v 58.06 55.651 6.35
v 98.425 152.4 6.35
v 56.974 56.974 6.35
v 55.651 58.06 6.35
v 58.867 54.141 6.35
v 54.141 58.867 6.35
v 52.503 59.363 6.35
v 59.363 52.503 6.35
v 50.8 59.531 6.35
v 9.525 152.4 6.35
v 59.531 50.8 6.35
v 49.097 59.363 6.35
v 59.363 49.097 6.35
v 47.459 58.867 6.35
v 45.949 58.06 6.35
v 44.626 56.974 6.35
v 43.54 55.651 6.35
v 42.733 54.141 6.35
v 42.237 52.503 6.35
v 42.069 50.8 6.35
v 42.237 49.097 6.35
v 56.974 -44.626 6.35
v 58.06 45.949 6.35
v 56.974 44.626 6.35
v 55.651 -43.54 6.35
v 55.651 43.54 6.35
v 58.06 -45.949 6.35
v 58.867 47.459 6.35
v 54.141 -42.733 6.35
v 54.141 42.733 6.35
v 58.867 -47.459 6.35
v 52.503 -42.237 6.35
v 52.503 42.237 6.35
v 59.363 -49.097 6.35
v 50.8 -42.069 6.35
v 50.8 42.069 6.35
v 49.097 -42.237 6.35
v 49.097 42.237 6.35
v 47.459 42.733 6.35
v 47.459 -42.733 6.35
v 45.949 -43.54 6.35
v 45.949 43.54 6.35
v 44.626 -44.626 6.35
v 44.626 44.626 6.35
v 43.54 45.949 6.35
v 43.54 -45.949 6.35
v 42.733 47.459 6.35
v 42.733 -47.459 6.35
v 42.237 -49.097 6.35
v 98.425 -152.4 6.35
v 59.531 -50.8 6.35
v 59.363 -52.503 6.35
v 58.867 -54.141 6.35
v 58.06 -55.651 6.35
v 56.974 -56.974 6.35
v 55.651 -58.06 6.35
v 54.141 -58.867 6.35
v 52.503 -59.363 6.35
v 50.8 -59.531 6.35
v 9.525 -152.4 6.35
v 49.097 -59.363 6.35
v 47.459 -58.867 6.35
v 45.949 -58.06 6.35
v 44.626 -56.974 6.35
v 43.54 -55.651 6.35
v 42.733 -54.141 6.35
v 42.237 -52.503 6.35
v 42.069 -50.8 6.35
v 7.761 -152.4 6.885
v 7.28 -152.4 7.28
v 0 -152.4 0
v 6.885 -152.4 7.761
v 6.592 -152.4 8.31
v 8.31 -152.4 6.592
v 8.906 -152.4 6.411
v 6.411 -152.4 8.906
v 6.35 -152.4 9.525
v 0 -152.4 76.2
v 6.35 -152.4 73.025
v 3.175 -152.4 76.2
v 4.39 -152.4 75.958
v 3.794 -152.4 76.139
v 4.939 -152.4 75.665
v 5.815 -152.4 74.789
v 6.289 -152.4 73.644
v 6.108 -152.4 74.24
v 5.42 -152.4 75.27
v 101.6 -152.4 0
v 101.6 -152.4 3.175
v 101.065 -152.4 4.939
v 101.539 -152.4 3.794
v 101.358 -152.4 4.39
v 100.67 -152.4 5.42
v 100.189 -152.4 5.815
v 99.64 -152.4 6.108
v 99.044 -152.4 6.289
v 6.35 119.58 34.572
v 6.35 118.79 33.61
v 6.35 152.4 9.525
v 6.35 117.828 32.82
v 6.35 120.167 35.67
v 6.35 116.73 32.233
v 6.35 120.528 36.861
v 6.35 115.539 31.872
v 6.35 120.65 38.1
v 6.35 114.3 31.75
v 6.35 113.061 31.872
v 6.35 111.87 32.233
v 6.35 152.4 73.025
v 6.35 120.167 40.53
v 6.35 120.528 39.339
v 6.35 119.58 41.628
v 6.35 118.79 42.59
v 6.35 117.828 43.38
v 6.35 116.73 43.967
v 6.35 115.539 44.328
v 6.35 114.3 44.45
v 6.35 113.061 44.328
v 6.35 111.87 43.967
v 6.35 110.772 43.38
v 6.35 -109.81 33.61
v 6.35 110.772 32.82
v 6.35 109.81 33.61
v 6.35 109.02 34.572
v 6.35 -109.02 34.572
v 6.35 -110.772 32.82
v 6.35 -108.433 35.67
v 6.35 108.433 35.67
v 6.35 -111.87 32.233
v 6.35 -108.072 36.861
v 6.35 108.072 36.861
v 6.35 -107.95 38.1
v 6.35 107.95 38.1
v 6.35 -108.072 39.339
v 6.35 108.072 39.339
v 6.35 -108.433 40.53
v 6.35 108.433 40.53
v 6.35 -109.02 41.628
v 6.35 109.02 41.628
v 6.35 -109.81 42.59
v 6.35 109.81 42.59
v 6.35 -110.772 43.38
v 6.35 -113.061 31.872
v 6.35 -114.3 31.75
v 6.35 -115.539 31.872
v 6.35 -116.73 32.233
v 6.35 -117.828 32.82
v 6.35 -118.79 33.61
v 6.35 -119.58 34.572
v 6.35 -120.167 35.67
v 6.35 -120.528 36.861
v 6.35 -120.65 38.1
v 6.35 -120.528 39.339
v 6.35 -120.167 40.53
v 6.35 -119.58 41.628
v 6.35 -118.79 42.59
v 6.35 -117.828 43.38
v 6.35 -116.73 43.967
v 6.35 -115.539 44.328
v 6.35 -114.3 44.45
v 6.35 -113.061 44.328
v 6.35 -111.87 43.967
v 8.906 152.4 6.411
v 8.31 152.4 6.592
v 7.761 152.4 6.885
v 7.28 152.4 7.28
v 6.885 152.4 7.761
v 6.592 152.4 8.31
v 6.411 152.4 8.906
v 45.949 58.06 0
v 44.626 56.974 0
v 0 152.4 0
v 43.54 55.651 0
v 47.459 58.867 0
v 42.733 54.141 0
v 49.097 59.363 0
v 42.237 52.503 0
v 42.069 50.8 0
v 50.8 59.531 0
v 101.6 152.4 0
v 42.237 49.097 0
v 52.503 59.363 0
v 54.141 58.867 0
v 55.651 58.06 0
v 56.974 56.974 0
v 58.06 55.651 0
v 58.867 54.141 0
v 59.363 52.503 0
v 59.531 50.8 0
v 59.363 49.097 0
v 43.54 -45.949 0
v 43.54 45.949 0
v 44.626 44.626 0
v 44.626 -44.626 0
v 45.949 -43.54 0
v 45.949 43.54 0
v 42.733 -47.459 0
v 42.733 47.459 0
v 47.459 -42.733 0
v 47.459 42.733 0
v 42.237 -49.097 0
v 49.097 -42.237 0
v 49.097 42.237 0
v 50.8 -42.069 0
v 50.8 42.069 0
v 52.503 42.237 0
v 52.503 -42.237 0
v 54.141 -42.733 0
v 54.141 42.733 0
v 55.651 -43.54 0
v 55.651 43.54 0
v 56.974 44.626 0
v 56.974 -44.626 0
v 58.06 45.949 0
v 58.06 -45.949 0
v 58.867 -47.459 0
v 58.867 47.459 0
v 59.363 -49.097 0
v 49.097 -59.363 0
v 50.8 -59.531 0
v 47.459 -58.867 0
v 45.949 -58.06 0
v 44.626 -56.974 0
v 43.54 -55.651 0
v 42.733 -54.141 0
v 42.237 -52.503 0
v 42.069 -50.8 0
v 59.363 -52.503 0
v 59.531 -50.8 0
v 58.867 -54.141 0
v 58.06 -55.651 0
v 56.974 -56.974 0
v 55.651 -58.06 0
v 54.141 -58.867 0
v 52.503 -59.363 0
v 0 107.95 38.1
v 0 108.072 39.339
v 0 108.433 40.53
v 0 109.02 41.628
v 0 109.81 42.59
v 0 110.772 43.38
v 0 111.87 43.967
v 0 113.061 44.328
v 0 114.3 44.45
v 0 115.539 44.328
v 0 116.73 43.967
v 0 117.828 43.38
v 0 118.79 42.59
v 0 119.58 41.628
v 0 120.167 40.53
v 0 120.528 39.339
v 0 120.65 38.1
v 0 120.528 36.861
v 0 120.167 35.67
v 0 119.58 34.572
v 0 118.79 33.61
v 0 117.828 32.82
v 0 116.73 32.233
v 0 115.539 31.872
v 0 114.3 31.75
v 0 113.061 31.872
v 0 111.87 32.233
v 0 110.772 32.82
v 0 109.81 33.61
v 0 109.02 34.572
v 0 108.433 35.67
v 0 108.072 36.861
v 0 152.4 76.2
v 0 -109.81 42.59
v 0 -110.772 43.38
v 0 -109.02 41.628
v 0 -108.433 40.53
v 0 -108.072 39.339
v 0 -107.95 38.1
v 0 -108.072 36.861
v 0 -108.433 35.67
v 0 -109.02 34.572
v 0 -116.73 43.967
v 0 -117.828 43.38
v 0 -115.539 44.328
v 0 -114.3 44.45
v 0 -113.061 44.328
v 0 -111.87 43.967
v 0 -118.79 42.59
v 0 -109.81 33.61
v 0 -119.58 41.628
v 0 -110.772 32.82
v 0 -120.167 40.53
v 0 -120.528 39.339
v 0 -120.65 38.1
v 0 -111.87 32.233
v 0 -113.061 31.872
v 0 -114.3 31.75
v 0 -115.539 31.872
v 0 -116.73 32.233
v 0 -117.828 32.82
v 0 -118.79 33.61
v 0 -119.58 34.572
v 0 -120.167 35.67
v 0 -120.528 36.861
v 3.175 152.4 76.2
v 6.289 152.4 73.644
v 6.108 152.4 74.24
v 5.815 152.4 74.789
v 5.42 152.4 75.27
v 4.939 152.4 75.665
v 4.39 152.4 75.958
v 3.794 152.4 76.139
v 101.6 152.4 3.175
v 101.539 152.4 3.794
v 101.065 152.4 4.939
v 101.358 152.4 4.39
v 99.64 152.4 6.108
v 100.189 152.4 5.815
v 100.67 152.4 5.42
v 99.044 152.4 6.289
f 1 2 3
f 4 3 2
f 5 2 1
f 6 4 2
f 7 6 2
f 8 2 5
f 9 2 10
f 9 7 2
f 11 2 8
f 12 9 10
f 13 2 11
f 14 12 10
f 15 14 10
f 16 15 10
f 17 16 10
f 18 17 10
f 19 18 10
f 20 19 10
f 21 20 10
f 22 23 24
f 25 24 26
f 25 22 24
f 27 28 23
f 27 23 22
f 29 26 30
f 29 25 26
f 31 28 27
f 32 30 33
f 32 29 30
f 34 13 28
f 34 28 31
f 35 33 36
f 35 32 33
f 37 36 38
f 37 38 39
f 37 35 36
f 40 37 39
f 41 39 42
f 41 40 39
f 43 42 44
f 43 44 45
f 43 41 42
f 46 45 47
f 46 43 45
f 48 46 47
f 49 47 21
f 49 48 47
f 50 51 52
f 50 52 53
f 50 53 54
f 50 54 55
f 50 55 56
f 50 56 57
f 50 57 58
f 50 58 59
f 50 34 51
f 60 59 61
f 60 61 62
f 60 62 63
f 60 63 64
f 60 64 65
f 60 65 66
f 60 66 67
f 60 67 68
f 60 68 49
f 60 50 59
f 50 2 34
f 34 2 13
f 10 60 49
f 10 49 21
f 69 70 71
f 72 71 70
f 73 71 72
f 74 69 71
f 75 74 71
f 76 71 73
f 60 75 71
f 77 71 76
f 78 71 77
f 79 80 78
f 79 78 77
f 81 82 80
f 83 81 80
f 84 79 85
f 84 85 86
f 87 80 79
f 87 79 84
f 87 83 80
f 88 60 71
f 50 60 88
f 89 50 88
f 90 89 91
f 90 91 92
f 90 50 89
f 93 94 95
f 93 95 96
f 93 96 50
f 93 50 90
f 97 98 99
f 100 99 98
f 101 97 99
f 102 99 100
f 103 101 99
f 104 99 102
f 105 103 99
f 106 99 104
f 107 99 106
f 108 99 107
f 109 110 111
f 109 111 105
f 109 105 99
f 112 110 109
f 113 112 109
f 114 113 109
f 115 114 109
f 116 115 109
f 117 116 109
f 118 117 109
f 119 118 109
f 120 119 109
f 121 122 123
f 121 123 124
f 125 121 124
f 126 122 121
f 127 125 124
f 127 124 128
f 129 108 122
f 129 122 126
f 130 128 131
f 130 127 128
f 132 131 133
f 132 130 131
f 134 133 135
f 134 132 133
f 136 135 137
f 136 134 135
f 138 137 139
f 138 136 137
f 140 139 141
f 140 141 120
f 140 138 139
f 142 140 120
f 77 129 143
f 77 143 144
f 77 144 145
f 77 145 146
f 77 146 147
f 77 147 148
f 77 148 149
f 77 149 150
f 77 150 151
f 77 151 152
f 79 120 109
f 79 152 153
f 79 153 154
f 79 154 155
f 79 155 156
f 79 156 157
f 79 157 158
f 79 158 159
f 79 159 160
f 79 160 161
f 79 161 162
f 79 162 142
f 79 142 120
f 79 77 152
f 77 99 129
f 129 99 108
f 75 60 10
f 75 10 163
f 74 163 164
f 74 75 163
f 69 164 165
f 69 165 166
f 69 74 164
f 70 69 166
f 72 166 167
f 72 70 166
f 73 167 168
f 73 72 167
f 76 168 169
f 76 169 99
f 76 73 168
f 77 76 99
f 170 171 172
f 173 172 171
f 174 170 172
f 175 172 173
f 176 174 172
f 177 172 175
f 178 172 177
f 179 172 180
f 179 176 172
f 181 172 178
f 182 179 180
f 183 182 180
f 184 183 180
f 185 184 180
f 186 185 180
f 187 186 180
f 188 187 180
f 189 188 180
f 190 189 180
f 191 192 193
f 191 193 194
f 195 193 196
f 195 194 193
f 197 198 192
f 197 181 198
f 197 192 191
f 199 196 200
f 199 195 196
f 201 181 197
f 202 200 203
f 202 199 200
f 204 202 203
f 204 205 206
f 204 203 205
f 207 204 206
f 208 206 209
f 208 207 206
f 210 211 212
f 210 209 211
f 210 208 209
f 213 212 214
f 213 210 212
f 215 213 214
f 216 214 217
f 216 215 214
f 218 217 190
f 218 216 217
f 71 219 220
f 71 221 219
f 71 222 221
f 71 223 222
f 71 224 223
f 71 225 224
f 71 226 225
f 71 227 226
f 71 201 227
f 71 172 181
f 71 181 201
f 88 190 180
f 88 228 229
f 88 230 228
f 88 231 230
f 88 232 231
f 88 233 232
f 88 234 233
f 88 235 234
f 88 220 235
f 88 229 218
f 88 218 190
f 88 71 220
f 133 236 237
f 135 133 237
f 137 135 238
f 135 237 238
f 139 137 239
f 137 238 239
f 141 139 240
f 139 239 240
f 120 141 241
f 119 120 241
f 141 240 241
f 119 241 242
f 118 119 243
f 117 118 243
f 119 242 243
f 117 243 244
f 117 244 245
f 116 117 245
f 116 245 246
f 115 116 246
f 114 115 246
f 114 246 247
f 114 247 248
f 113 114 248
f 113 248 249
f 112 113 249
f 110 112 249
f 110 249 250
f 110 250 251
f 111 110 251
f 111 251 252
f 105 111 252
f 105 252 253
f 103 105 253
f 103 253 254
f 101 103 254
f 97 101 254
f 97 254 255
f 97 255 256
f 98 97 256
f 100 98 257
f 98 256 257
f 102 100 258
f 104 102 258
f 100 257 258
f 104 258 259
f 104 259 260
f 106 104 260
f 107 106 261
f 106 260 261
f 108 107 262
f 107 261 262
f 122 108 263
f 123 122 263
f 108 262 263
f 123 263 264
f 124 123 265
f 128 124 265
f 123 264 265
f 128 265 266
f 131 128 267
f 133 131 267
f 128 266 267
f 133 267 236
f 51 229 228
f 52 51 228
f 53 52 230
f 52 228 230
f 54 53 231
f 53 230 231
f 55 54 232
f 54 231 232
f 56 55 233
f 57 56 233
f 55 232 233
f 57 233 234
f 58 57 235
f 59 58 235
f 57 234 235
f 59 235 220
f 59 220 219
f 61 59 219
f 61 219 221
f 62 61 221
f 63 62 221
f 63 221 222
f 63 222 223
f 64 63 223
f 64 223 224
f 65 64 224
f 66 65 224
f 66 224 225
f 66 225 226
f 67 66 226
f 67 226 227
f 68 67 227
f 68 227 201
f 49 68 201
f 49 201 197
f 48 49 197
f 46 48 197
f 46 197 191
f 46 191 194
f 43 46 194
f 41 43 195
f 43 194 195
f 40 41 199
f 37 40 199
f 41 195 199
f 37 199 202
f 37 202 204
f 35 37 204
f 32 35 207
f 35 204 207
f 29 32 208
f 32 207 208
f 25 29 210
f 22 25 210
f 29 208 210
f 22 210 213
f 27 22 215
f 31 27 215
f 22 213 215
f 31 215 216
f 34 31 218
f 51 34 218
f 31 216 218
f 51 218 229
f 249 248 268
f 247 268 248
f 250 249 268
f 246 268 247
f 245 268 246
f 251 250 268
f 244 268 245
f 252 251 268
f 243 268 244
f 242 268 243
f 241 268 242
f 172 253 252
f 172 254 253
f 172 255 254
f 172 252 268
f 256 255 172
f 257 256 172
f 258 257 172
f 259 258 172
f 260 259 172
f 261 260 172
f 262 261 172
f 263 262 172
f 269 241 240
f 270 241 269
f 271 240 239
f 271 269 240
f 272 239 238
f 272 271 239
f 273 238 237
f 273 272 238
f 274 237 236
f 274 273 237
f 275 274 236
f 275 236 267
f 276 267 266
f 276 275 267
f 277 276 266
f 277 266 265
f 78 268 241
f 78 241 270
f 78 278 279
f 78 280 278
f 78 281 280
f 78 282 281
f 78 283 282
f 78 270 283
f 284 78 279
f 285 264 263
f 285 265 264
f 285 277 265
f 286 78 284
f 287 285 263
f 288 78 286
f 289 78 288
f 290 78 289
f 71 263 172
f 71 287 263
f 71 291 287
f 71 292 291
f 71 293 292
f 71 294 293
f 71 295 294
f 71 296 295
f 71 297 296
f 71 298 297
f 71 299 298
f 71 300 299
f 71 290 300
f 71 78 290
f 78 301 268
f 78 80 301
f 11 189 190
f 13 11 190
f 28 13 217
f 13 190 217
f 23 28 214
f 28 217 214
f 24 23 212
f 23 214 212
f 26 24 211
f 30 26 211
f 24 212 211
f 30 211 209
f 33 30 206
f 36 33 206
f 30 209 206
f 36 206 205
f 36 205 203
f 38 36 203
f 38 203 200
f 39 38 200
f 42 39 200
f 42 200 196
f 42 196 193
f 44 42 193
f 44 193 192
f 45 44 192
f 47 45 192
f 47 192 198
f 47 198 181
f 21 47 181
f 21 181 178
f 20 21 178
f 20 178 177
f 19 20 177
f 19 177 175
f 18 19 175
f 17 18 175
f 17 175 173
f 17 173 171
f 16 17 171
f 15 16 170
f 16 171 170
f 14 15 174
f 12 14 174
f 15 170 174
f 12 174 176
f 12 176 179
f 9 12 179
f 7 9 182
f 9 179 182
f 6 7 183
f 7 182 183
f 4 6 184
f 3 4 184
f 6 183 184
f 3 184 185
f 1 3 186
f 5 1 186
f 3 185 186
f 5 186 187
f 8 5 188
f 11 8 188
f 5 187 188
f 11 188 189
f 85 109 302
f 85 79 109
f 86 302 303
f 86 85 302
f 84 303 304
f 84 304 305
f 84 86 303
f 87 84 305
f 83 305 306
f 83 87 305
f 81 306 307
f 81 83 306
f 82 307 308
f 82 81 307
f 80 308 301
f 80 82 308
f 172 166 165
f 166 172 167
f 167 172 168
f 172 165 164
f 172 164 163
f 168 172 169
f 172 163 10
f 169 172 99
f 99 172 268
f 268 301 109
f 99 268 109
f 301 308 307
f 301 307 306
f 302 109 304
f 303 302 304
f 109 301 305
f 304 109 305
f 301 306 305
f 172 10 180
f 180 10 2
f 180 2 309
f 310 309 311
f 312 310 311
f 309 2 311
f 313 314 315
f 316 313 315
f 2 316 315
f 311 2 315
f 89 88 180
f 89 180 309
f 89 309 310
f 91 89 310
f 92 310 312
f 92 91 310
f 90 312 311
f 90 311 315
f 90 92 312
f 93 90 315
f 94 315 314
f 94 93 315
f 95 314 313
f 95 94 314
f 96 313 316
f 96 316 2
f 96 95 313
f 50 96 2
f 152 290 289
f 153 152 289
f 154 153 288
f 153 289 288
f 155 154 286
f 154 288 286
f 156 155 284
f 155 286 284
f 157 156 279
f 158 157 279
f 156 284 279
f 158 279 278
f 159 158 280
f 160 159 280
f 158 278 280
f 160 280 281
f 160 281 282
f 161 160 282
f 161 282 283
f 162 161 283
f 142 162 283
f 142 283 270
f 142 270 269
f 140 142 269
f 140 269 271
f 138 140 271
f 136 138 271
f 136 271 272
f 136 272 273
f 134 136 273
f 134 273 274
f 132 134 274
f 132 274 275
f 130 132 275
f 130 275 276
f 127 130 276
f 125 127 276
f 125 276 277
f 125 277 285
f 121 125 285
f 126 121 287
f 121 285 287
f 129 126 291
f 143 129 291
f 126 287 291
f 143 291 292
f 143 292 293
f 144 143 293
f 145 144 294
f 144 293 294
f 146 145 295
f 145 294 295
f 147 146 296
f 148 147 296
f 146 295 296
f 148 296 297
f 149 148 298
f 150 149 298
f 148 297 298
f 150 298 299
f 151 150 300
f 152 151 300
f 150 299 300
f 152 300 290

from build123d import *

# Parameters (mm, degrees)
F1_DEPTH = 152.4
F2_R     = 8.73125
F3_DEPTH = 76.201
F4_R     = 6.35
F5_DEPTH = 101.601


with BuildPart() as f1:
    # F0 (on Front) → F1 (new body, symmetric)
    with BuildSketch(Plane.XZ):
        with BuildLine():
            Line((3.175, 76.2), (0, 76.2))
            Line((0, 76.2), (0, 0))
            Line((0, 0), (101.6, 0))
            Line((101.6, 0), (101.6, 3.175))
            ThreePointArc((101.6, 3.175), (100.6700640303, 5.4200640303), (98.425, 6.35))
            Line((98.425, 6.35), (9.525, 6.35))
            ThreePointArc((9.525, 6.35), (7.2799359697, 7.2799359697), (6.35, 9.525))
            Line((6.35, 9.525), (6.35, 73.025))
            ThreePointArc((6.35, 73.025), (5.4200640303, 75.2700640303), (3.175, 76.2))
        make_face()
    extrude(amount=F1_DEPTH, both=True)

    # F2 (on face) → F3 (cut, through all)
    with BuildSketch(Plane(origin=(0, 0, 0), x_dir=(1, 0, 0), z_dir=(0, 0, -1))):
        with Locations((50.8, 50.8)):
            Circle(F2_R)
        with Locations((50.8, -50.8)):
            Circle(F2_R)
    extrude(amount=-F3_DEPTH, mode=Mode.SUBTRACT)

    # F4 (on face) → F5 (cut, through all)
    with BuildSketch(Plane(origin=(0, 0, 0), x_dir=(0, -1, 0), z_dir=(-1, 0, 0))):
        with Locations((-114.3, 38.1)):
            Circle(F4_R)
        with Locations((114.3, 38.1)):
            Circle(F4_R)
    extrude(amount=-F5_DEPTH, mode=Mode.SUBTRACT)


solid = f1.part
